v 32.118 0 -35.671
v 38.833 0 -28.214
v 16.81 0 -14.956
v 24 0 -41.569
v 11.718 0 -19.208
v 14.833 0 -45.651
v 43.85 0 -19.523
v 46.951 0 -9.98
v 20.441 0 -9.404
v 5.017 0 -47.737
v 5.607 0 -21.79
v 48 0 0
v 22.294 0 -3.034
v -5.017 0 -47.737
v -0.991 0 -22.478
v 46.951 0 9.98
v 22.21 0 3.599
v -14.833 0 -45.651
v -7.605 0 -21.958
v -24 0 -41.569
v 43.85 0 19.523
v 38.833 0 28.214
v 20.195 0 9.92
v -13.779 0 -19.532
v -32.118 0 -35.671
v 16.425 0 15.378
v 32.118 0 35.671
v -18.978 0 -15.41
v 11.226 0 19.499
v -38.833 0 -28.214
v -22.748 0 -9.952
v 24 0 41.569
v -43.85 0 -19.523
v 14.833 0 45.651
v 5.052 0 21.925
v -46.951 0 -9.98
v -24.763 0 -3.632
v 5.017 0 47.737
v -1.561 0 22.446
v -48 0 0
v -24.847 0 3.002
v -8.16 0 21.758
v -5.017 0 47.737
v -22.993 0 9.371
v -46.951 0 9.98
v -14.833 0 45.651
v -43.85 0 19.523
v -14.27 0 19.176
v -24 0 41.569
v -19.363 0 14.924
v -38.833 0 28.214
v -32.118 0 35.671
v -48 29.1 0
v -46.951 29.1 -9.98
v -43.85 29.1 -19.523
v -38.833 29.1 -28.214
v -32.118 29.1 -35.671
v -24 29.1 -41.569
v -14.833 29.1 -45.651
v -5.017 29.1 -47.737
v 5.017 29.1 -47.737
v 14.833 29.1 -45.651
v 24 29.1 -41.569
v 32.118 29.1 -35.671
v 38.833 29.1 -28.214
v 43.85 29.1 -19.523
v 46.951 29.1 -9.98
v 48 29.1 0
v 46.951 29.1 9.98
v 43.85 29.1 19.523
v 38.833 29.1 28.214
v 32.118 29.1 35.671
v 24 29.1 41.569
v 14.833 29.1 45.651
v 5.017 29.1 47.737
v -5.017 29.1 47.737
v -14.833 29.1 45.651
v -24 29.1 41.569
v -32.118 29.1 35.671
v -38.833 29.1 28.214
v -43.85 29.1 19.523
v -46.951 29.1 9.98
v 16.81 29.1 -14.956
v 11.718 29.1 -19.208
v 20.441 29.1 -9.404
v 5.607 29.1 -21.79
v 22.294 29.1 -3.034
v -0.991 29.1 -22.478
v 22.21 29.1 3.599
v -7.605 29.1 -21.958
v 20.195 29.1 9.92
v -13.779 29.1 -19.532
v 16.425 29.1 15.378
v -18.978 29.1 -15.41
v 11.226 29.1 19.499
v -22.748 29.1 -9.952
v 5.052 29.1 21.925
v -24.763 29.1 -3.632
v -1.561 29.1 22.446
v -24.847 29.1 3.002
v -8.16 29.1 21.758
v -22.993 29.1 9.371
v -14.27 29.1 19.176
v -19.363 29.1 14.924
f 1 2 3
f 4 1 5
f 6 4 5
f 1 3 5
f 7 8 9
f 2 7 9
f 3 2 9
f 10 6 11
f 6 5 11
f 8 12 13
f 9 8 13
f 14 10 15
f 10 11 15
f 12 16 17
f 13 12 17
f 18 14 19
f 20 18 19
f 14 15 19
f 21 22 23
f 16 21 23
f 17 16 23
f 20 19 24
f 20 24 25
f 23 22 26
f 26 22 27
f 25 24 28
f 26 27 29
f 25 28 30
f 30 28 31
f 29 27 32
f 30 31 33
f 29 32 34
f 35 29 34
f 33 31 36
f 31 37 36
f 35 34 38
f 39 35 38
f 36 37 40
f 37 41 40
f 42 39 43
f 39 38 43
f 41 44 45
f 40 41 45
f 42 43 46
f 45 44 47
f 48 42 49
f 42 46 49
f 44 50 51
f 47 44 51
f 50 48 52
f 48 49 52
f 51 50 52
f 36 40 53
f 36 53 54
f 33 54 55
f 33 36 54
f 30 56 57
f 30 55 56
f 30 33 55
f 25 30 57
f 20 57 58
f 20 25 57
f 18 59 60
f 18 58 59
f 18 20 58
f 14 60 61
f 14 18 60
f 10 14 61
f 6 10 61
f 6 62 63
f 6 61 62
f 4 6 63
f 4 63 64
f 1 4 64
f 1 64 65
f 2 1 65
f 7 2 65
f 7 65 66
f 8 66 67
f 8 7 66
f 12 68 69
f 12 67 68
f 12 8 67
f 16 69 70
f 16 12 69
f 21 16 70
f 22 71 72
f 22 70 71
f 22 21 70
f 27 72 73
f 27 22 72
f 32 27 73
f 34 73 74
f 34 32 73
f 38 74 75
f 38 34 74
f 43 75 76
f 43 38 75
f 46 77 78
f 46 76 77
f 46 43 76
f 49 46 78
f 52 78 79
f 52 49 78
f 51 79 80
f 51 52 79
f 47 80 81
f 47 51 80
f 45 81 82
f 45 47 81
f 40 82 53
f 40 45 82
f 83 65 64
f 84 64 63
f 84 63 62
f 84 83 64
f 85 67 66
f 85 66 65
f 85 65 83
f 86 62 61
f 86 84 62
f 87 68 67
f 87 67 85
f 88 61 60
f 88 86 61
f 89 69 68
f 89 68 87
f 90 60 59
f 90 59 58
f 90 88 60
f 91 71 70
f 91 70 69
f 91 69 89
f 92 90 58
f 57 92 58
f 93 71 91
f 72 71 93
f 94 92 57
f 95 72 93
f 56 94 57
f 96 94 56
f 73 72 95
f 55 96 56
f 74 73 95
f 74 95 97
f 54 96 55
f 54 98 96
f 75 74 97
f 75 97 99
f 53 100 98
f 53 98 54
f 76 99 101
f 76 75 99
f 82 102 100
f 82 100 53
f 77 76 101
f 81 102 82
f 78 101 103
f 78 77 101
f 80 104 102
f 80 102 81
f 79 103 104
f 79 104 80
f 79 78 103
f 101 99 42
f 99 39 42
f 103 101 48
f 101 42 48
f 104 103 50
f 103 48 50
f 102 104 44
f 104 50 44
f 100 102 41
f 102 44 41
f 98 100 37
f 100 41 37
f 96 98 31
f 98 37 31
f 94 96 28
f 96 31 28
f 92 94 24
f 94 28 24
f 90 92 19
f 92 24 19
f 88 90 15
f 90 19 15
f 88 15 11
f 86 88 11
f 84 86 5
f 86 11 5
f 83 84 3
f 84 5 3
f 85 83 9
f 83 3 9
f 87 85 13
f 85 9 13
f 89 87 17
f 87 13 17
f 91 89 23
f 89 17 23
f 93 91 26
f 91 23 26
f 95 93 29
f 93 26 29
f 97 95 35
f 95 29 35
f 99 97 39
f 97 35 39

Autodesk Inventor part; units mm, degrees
ref_plane "YZ Plane" through (0, 0, 0) normal (1, 0, 0) x (0, 1, 0)
ref_plane "XZ Plane" through (0, 0, 0) normal (0, 1, 0) x (-1, 0, 0)
ref_plane "XY Plane" through (0, 0, 0) normal (0, 0, 1) x (1, 0, 0)
sketch "Sketch1" plane through (0, 0, 0) normal (0, 1, 0) x (-1, 0, 0)
  circle A0 centre (0, 0) radius 48
  dimension "d0" = 96
extrude "Extrusion1" add sketch "Sketch1" along normal blind 29.1
sketch "Sketch2" plane through (0, 29.1, 0) normal (0, 1, 0) x (1, 0, 0)
  point P0 (0, 0)
  point P1 (-2.5528, 0.0324)
hole "Hole1" at (-2.5528, 29.1, -0.0324) direction (0, -1, 0) diameter 45 end through all
sketch "Sketch3" plane through (0, 29.1, 0) normal (0, 1, 0) x (1, 0, 0)
  point P0 (0, 0)
sketch "Sketch4" plane through (0, 29.1, 0) normal (0, 1, 0) x (1, 0, 0)
  point P0 (0, 0)
hole "Hole2" at (0, 29.1, 0) direction (0, -1, 0) diameter 45 end through all
properties part number "bobina_sin_numero"
